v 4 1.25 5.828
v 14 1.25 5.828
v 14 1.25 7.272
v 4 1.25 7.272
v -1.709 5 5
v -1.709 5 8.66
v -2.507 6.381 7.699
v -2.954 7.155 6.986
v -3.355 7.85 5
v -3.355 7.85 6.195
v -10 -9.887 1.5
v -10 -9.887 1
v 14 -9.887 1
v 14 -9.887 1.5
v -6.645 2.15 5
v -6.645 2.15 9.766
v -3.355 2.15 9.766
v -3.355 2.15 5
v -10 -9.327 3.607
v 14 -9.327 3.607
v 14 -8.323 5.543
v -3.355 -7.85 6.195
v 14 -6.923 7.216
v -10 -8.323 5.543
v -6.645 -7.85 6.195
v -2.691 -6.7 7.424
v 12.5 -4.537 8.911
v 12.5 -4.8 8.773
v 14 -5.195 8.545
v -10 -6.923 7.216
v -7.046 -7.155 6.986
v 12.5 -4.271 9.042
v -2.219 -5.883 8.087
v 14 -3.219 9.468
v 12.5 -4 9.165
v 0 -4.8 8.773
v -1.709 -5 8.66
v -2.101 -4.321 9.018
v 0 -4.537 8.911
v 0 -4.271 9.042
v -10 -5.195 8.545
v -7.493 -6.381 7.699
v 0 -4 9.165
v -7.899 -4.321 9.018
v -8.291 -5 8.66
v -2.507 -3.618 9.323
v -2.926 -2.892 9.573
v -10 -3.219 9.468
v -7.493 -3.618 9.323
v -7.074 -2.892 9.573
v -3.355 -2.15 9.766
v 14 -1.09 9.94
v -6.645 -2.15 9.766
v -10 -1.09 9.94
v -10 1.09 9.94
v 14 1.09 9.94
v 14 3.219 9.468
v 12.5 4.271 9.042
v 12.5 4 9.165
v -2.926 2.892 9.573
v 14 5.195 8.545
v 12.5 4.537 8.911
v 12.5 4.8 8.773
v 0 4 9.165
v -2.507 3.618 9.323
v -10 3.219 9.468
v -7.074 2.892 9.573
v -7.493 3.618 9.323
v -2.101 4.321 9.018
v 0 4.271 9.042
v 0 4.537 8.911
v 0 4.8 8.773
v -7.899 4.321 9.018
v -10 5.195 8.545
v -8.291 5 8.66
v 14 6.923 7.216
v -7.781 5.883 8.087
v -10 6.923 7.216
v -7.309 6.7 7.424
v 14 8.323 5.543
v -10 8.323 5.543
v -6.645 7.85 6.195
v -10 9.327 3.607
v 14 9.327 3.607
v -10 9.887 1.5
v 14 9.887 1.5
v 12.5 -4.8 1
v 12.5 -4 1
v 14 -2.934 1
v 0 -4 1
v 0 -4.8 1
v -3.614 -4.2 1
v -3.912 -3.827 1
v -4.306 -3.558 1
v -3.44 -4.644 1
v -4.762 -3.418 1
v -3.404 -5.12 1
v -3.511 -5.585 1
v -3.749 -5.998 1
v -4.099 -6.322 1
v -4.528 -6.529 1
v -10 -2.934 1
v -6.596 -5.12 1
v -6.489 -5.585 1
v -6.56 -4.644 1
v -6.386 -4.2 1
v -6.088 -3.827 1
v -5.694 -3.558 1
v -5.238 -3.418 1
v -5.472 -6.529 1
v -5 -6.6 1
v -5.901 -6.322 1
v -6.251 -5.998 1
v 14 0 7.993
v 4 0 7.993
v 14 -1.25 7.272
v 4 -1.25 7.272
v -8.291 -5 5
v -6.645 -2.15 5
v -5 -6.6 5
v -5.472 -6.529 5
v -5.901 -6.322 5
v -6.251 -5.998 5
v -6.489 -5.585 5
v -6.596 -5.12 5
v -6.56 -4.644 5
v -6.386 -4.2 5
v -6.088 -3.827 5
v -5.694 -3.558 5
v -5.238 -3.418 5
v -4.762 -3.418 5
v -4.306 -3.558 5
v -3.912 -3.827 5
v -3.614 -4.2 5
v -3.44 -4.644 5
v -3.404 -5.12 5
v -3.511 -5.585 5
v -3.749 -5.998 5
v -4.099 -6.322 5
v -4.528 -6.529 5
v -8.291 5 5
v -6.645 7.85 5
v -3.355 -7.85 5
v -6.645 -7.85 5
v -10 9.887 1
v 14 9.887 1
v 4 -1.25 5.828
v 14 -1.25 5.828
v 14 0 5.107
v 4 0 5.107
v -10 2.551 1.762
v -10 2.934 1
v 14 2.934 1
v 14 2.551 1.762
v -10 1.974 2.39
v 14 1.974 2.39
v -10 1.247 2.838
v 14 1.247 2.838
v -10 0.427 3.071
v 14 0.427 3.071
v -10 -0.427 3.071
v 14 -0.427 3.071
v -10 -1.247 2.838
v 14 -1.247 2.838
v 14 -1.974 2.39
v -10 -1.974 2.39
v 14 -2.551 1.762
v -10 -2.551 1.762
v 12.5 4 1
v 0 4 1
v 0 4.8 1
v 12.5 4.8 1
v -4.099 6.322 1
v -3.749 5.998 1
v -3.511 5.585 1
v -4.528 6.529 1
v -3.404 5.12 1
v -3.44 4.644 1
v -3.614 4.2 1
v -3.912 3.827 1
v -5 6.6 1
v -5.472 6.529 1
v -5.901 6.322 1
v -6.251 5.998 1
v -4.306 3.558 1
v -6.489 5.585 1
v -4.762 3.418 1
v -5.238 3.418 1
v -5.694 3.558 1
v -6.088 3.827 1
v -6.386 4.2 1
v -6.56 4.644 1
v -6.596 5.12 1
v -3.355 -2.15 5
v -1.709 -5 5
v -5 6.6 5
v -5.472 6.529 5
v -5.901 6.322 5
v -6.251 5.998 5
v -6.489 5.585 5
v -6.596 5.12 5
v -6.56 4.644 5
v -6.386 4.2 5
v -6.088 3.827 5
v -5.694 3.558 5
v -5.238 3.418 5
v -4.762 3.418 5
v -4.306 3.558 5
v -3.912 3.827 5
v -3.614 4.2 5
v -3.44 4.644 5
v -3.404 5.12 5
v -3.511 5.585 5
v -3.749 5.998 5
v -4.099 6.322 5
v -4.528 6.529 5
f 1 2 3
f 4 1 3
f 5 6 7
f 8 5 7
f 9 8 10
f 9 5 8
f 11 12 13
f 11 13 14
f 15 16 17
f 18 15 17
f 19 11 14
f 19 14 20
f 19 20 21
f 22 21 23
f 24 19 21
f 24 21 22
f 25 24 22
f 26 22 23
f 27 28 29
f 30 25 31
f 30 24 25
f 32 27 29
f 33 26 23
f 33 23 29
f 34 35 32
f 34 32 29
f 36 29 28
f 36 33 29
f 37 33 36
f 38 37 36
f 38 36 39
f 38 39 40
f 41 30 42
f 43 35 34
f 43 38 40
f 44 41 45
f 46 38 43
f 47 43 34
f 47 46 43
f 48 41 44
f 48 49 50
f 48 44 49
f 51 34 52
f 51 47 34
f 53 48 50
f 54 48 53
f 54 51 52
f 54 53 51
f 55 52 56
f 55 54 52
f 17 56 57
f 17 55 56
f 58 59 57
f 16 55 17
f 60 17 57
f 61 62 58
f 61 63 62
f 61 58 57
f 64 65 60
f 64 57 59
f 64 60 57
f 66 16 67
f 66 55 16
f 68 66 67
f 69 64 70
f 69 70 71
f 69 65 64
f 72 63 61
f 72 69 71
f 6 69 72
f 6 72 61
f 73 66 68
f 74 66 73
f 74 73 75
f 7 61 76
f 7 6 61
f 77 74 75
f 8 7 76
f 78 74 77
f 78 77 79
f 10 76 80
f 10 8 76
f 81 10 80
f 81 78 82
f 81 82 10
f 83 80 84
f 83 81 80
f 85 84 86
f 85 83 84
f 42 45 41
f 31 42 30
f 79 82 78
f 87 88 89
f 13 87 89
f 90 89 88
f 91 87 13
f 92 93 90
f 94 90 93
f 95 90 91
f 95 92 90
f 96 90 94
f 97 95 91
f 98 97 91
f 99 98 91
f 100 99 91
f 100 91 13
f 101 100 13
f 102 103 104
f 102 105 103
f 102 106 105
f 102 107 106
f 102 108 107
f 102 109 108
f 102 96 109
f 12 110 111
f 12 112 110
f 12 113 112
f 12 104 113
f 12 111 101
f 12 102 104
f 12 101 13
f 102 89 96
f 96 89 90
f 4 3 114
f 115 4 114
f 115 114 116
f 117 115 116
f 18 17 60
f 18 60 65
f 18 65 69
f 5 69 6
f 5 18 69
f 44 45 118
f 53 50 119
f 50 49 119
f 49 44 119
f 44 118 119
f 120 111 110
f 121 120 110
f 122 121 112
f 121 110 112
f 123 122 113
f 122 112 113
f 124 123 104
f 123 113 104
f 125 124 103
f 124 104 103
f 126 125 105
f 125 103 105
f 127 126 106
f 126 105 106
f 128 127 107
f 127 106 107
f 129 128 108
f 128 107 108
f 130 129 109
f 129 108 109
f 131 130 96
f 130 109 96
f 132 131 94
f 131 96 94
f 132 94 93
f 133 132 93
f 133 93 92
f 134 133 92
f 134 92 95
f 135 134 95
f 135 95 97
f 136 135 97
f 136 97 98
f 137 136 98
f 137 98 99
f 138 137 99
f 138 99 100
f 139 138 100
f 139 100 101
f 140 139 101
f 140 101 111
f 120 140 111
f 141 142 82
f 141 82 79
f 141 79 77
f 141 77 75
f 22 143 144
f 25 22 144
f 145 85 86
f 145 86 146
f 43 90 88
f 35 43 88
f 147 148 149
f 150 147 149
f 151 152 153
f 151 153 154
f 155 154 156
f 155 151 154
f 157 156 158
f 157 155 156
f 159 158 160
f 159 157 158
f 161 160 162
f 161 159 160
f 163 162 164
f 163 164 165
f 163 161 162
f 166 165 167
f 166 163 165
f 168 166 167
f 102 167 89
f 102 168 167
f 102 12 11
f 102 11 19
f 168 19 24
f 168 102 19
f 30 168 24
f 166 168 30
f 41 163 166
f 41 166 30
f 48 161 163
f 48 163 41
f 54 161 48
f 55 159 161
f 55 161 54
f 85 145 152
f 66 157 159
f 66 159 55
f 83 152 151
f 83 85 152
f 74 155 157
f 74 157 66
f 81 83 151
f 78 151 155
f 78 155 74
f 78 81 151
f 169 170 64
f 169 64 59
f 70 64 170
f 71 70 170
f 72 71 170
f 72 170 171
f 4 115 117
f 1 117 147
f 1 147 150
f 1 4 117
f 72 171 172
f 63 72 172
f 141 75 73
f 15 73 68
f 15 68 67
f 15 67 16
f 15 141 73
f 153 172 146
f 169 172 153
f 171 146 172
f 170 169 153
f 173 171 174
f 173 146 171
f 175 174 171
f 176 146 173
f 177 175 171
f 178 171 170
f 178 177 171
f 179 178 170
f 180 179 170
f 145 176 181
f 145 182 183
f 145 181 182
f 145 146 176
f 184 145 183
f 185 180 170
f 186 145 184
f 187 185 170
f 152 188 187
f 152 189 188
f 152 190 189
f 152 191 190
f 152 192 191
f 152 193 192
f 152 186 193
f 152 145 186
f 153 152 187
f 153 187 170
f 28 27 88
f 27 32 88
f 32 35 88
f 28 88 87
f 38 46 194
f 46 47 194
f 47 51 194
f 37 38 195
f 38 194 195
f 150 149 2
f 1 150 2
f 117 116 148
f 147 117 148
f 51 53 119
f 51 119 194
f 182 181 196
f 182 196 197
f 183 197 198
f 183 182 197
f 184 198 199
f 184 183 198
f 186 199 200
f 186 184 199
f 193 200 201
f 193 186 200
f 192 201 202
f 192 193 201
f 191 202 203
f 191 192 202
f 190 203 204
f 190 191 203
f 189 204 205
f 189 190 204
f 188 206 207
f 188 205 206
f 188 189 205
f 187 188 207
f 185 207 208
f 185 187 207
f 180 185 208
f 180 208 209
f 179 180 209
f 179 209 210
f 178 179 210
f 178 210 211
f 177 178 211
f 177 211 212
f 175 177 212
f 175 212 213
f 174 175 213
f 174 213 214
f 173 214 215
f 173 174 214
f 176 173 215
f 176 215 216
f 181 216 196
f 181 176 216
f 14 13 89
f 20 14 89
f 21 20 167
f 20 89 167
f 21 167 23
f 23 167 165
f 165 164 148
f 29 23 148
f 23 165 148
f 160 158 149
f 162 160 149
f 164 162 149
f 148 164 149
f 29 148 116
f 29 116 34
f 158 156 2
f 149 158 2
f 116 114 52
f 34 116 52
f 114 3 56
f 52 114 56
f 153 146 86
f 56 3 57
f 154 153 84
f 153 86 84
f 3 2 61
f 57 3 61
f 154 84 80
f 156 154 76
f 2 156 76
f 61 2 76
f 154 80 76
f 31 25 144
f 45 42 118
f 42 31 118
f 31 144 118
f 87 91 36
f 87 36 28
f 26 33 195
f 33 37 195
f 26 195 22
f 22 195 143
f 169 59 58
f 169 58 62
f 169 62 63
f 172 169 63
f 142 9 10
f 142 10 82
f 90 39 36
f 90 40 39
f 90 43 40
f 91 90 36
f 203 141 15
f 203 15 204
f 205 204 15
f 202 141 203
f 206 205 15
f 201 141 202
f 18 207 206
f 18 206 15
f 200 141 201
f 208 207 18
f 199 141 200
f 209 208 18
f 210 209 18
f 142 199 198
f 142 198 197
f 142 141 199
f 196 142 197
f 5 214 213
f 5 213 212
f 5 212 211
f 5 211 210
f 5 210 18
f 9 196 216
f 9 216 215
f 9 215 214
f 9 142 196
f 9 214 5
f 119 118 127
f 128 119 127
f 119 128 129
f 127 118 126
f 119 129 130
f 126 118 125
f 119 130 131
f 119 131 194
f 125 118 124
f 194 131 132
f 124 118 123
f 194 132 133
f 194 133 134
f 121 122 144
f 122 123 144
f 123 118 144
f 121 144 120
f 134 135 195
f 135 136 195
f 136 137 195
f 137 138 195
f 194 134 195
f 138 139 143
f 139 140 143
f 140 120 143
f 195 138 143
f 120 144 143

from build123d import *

# Parameters (mm, degrees)
AUFSATZ_LINEAR_AUSTRAGEN1_DEPTH      = 14
AUFSATZ_LINEAR_AUSTRAGEN1_DEPTH_BACK = 10
SKIZZE2_W                            = 12.5
SKIZZE2_H                            = 0.8
SCHNITT_LINEAR_AUSTRAGEN1_DEPTH      = 20.843134833
SCHNITT_LINEAR_START                 = 5
SCHNITT_LINEAR_AUSTRAGEN2_DEPTH      = 15.843134833
SKIZZE4_R                            = 1.6
SCHNITT_LINEAR_AUSTRAGEN3_DEPTH      = 20.843134833
SCHNITT_LINEAR_START_2               = 14
SCHNITT_LINEAR_AUSTRAGEN4_DEPTH      = 10


with BuildPart() as part:
    # Skizze1 → Aufsatz-Linear austragen1 (new, two sides: drawn at the far end of the back side and taken through both)
    with BuildSketch(Plane(origin=(0, 0, 0), x_dir=(0, 0, -1), z_dir=(1, 0, 0)).offset(-AUFSATZ_LINEAR_AUSTRAGEN1_DEPTH_BACK)):
        with BuildLine():
            Line((-1.5, 9.886859967), (-1, 9.886859967))
            Line((-1, 9.886859967), (-1, 2.93428015))
            ThreePointArc((-1, 2.93428015), (-3.1, 0), (-1, -2.93428015))
            Line((-1, -2.93428015), (-1, -9.886859967))
            Line((-1, -9.886859967), (-1.5, -9.886859967))
            ThreePointArc((-1.5, -9.886859967), (-10, 0), (-1.5, 9.886859967))
        make_face()
    extrude(amount=AUFSATZ_LINEAR_AUSTRAGEN1_DEPTH + AUFSATZ_LINEAR_AUSTRAGEN1_DEPTH_BACK)

    # Skizze2 → Schnitt-Linear austragen1 (cut, through all)
    with BuildSketch(Plane.XY):
        with Locations((6.25, 4.4)):
            Rectangle(SKIZZE2_W, SKIZZE2_H)
    schnitt_linear_austragen1 = extrude(amount=SCHNITT_LINEAR_AUSTRAGEN1_DEPTH, mode=Mode.SUBTRACT)

    # Skizze3 → Schnitt-Linear austragen2 (cut, through all)
    with BuildSketch(Plane.XY.offset(SCHNITT_LINEAR_START)):
        Polygon((-3.354551733, 2.15), (-1.709103466, 5), (-3.354551733, 7.85), (-6.645448267, 7.85), (-8.290896534, 5), (-6.645448267, 2.15), align=None)
    schnitt_linear_austragen2 = extrude(amount=SCHNITT_LINEAR_AUSTRAGEN2_DEPTH, mode=Mode.SUBTRACT)

    # Skizze4 → Schnitt-Linear austragen3 (cut, through all)
    with BuildSketch(Plane.XY):
        with Locations(Location((-5, 5, 0), (0, 0, 90))):
            Circle(SKIZZE4_R)
    schnitt_linear_austragen3 = extrude(amount=SCHNITT_LINEAR_AUSTRAGEN3_DEPTH, mode=Mode.SUBTRACT)

    # Spiegeln1: Schnitt-Linear austragen1, Schnitt-Linear austragen2, Schnitt-Linear austragen3 across plane
    add(schnitt_linear_austragen1.mirror(Plane.ZX), mode=Mode.SUBTRACT)
    add(schnitt_linear_austragen2.mirror(Plane.ZX), mode=Mode.SUBTRACT)
    add(schnitt_linear_austragen3.mirror(Plane.ZX), mode=Mode.SUBTRACT)

    # Skizze6 → Schnitt-Linear austragen4 (cut)
    with BuildSketch(Plane(origin=(0, 0, 0), x_dir=(0, 0, -1), z_dir=(1, 0, 0)).offset(SCHNITT_LINEAR_START_2)):
        Polygon((-5.828312164, 1.25), (-7.271687836, 1.25), (-7.993375673, 0), (-7.271687836, -1.25), (-5.828312164, -1.25), (-5.106624327, 0), align=None)
    extrude(amount=-SCHNITT_LINEAR_AUSTRAGEN4_DEPTH, mode=Mode.SUBTRACT)


solid = part.part
